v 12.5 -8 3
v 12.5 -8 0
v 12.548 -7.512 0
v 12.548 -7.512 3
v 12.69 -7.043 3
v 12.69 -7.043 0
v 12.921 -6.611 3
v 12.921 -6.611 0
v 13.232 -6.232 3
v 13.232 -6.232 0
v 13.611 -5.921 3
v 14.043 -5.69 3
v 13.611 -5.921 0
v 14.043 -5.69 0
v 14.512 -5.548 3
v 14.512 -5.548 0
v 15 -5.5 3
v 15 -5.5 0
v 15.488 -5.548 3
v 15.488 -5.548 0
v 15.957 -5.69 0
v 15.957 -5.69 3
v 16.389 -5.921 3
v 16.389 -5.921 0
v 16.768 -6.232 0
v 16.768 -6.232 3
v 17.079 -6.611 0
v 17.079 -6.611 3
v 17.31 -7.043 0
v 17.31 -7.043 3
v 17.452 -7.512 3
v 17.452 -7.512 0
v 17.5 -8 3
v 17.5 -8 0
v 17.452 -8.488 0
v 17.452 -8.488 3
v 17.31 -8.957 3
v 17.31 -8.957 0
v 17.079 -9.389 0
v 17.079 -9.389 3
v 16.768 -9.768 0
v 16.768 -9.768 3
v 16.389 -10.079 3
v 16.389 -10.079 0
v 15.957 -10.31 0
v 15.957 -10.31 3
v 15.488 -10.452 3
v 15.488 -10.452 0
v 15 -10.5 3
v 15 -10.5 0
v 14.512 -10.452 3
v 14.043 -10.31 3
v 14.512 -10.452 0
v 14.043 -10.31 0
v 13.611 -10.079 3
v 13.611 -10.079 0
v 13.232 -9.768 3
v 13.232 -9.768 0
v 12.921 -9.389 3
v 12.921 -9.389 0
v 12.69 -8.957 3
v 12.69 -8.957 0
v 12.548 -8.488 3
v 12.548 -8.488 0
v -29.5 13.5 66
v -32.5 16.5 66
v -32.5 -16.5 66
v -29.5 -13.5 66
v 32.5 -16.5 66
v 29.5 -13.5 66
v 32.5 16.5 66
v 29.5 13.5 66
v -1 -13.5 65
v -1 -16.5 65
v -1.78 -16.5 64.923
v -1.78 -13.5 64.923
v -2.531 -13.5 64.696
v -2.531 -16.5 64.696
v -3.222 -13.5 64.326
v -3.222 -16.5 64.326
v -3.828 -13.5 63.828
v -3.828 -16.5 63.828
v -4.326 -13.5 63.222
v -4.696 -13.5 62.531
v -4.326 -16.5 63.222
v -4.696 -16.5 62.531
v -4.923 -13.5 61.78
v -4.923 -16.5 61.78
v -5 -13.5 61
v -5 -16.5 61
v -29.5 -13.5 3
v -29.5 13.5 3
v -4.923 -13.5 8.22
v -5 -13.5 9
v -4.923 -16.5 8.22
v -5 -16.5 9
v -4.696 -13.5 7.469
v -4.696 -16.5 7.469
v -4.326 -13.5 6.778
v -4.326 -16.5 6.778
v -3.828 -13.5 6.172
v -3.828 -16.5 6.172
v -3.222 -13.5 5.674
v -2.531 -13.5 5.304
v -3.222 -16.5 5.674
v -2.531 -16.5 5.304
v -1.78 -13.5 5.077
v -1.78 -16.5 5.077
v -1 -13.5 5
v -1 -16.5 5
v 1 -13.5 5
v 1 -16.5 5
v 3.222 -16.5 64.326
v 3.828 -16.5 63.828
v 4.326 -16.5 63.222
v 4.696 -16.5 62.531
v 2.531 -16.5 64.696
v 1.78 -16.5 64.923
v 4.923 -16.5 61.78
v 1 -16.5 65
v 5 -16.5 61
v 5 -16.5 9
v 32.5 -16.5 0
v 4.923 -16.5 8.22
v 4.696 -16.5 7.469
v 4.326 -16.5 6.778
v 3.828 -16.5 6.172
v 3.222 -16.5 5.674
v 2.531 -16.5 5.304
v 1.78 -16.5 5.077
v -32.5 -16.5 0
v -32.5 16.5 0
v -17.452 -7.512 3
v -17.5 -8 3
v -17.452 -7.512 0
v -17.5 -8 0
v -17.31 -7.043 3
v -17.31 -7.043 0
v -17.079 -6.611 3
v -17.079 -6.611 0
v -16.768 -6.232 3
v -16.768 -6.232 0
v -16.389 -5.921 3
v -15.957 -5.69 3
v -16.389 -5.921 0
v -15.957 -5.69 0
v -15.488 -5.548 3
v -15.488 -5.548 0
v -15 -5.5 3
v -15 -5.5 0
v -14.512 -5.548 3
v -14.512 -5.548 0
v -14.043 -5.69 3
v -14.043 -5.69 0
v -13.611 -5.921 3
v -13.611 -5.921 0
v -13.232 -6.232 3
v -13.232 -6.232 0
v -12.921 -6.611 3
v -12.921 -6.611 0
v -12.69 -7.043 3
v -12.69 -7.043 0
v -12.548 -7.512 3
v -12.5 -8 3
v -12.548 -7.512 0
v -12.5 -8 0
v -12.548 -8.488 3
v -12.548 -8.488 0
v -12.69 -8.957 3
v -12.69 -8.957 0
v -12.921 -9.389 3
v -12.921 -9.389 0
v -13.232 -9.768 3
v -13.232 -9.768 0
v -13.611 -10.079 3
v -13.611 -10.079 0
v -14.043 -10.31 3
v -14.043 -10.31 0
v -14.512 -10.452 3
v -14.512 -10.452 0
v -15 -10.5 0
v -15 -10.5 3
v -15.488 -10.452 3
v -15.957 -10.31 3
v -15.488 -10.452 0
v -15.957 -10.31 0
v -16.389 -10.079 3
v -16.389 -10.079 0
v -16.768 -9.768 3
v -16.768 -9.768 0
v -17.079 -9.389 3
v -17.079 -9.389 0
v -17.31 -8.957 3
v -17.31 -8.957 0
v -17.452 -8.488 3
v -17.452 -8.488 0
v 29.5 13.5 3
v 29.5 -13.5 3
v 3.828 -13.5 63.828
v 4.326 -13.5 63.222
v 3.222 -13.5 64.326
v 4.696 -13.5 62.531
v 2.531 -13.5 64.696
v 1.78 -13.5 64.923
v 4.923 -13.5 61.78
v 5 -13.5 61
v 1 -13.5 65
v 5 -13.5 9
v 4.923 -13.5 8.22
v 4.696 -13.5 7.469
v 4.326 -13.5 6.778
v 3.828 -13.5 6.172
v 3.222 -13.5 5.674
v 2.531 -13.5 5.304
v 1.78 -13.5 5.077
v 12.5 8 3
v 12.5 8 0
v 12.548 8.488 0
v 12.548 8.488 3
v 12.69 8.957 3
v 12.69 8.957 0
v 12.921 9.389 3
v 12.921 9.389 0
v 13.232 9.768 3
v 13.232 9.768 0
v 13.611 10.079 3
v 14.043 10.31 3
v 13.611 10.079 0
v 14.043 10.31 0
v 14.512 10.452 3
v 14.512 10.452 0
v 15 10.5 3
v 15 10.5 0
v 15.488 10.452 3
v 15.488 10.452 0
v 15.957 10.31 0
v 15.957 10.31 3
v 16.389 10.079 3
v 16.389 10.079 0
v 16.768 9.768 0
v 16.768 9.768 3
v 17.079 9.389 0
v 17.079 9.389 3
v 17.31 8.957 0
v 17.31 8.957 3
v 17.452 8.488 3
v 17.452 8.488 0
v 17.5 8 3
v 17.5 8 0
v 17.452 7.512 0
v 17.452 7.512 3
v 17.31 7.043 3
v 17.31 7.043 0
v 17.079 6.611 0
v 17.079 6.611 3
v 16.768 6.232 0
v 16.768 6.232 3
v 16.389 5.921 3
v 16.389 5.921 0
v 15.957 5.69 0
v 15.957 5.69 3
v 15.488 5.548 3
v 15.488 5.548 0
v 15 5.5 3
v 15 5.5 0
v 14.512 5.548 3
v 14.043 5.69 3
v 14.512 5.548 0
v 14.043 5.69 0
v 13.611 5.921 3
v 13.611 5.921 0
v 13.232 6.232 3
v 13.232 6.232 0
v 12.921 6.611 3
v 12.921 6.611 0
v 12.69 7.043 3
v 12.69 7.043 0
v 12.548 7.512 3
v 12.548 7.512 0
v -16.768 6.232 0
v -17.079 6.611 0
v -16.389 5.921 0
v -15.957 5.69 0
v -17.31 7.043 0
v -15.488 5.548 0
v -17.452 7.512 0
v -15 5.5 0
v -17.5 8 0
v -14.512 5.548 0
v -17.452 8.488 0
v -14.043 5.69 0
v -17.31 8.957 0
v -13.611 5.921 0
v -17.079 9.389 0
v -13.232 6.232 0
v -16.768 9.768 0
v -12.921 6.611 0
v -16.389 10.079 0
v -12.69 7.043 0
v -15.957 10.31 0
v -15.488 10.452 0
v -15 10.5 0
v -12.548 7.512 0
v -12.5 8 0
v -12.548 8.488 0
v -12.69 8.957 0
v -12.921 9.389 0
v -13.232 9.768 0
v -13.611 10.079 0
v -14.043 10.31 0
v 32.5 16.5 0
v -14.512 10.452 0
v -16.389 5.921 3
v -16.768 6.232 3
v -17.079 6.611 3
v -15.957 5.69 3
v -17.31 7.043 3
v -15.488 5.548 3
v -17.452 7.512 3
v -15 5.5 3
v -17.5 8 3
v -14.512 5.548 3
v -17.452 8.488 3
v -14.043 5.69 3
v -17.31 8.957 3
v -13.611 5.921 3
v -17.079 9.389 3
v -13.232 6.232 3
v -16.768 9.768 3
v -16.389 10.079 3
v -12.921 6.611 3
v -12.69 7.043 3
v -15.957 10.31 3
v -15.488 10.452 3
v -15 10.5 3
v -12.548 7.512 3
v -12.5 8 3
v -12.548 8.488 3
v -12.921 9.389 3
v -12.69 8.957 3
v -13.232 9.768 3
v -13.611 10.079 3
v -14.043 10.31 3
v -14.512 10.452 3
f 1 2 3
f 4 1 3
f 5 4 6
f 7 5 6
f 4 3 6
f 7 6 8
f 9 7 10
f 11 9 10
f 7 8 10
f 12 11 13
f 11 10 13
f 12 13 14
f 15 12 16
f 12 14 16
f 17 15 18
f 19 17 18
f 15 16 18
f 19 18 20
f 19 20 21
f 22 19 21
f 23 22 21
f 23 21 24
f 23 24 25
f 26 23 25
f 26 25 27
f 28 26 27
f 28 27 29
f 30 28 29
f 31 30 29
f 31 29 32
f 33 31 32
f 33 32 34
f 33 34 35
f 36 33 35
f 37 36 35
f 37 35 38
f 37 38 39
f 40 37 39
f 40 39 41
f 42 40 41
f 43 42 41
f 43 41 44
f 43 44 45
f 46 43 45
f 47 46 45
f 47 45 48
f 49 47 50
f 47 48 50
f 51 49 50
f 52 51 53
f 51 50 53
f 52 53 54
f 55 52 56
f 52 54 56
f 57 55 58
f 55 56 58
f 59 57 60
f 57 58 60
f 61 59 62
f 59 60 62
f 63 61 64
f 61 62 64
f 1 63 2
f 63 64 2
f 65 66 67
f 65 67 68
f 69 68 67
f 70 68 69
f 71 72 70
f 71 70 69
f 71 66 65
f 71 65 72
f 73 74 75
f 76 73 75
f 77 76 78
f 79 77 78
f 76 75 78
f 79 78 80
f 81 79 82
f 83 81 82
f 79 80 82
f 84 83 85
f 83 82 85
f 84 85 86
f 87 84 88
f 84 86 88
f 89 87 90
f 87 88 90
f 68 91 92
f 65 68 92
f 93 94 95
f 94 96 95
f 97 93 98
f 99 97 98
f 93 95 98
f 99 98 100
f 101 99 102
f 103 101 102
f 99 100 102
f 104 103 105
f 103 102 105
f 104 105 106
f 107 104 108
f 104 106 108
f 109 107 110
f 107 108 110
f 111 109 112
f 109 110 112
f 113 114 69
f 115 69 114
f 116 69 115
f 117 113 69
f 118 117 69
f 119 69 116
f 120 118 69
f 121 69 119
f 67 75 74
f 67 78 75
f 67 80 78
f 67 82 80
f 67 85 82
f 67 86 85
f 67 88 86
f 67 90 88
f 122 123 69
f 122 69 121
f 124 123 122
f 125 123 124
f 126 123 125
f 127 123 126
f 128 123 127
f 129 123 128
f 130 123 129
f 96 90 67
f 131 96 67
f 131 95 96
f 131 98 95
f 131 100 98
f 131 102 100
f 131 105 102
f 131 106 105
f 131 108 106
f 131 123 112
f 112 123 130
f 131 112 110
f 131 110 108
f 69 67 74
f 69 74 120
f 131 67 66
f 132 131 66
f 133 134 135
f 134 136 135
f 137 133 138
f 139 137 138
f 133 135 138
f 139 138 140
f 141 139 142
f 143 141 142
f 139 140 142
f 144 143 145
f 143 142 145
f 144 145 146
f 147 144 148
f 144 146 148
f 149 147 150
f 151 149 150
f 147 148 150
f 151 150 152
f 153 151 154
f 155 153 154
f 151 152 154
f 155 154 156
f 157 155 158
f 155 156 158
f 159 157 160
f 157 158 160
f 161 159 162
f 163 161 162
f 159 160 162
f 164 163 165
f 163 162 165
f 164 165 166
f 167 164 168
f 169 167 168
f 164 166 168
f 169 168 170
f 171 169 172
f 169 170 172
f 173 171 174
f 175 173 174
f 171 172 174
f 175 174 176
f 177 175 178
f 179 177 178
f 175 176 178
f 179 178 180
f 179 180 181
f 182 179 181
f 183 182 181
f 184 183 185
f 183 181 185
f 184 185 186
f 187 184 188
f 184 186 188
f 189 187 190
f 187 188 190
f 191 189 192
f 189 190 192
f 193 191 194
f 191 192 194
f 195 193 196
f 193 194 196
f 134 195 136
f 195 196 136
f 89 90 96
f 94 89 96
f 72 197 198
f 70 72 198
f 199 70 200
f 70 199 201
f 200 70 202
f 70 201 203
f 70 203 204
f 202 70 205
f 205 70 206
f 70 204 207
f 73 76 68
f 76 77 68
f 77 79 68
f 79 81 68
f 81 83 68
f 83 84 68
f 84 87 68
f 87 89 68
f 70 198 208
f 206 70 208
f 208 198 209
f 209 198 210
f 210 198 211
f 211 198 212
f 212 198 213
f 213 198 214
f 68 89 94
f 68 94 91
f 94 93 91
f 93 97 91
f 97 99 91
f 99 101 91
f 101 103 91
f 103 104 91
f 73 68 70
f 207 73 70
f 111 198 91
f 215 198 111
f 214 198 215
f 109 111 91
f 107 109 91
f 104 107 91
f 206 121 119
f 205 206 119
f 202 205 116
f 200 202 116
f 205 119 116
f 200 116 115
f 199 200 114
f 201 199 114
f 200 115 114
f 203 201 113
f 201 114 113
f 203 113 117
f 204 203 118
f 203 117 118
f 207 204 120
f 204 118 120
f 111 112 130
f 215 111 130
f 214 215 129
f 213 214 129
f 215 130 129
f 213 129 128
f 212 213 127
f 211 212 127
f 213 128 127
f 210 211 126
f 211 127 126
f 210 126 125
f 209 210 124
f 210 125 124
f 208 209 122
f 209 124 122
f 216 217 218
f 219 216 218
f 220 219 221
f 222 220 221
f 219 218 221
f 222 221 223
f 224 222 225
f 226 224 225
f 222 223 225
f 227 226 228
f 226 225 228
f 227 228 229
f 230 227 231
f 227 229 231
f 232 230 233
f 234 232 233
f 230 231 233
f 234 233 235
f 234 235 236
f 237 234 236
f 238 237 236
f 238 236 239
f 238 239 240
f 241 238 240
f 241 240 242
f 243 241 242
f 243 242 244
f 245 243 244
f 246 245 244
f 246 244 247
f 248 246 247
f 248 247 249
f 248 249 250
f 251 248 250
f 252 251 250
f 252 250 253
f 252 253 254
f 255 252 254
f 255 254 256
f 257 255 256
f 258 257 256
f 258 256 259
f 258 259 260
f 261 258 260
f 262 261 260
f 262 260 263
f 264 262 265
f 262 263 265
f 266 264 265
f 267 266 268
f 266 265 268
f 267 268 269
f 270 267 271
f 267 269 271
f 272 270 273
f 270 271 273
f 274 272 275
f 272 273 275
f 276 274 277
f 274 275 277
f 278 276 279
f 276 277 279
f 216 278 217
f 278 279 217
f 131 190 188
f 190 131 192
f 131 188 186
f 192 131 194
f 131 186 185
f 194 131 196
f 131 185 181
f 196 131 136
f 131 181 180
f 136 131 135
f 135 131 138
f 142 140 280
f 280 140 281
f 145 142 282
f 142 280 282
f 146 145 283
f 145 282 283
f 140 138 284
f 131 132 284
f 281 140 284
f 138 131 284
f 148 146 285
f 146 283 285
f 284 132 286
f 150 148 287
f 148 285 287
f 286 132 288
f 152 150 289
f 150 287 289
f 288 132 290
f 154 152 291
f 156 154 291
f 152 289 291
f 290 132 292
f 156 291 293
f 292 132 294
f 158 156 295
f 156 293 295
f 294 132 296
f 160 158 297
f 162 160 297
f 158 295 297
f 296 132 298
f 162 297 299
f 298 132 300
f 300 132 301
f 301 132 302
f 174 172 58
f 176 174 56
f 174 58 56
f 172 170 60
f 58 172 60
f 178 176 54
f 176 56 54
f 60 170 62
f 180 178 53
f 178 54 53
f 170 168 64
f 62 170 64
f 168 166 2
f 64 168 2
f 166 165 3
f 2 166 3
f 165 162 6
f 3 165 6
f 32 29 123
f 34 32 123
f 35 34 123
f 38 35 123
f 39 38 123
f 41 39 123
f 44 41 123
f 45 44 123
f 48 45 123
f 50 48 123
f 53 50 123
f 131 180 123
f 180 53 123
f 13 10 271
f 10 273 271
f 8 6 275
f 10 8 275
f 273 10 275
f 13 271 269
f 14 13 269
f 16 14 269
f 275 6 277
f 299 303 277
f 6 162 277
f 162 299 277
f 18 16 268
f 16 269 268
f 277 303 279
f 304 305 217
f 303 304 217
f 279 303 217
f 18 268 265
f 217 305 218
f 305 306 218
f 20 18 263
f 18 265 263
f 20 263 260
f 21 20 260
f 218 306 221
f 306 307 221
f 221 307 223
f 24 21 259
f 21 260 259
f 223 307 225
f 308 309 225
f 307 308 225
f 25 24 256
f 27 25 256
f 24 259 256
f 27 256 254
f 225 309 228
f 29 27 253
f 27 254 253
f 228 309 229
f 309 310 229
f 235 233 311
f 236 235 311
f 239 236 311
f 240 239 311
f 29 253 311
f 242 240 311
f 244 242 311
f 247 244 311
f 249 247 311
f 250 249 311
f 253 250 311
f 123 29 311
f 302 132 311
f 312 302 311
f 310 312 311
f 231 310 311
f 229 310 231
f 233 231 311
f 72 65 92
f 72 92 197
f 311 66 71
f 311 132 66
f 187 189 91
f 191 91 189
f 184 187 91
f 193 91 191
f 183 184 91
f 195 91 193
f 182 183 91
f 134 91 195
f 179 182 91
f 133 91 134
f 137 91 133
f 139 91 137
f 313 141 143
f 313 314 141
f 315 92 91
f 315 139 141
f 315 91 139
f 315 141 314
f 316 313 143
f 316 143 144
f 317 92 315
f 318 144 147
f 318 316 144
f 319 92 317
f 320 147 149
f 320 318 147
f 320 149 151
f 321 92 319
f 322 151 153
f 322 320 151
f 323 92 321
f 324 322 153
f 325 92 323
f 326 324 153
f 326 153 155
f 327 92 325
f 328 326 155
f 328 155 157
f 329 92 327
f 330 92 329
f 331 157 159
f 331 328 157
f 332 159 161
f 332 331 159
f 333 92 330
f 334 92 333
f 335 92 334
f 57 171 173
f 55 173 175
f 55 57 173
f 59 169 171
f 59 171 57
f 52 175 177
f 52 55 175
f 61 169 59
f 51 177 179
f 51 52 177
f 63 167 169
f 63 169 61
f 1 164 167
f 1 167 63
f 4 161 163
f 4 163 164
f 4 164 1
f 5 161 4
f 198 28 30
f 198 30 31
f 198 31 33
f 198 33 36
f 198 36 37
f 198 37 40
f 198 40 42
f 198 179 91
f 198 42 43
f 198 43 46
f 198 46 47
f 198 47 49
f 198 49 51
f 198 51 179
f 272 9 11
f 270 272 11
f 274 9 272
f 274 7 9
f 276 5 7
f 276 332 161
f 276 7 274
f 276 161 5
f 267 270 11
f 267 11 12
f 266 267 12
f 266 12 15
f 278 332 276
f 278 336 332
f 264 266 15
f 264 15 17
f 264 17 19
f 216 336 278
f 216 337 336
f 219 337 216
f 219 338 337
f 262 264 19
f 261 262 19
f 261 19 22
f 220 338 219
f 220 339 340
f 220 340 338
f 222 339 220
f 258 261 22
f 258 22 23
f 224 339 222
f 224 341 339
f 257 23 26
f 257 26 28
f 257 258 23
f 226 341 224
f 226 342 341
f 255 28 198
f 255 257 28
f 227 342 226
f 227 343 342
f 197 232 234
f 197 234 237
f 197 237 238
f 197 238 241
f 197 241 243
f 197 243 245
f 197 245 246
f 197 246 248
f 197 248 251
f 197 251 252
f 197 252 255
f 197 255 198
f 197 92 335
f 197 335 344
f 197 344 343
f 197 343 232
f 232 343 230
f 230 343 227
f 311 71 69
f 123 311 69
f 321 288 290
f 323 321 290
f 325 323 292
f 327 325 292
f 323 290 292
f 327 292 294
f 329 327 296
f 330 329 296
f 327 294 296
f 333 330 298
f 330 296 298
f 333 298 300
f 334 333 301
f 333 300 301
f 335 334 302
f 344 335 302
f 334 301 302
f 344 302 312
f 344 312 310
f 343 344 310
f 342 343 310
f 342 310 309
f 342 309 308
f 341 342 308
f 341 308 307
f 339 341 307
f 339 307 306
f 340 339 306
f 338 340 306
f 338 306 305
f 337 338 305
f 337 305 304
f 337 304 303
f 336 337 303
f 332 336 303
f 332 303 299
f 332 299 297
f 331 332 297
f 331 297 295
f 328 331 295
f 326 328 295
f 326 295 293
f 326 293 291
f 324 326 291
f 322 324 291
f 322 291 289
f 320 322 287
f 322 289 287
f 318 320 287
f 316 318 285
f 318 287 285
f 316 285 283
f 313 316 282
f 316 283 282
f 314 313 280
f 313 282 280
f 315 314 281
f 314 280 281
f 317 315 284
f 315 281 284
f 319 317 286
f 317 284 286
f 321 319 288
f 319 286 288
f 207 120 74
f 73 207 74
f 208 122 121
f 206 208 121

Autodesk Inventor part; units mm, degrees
ref_plane "YZ Plane" through (0, 0, 0) normal (1, 0, 0) x (0, 1, 0)
ref_plane "XZ Plane" through (0, 0, 0) normal (0, 1, 0) x (-1, 0, 0)
ref_plane "XY Plane" through (0, 0, 0) normal (0, 0, 1) x (1, 0, 0)
sketch "Sketch1" plane through (0, 0, 0) normal (0, 0, 1) x (1, 0, 0)
  line L0 (-32.5, 16.5) -> (32.5, 16.5)
  line L1 (32.5, 16.5) -> (32.5, -16.5)
  line L2 (32.5, -16.5) -> (-32.5, -16.5)
  line L3 (-32.5, -16.5) -> (-32.5, 16.5)
  line L4 (-32.5, 16.5) -> (32.5, -16.5) construction
  line L5 (32.5, 16.5) -> (-32.5, -16.5) construction
  point P0 (0, 0)
  dimension "d0" = 65
  dimension "d1" = 33
extrude "Extrusion1" add sketch "Sketch1" along normal blind 66
shell "Shell1" thickness 3 removed faces 1 at (-10.8333, 5.5, 66)
sketch "Sketch2" plane through (-32.5, -16.5, 0) normal (0, -1, 0) x (1, 0, 0)
  line L0 (33.5, 65) -> (31.5, 65)
  line L1 (27.5, 61) -> (27.5, 9)
  line L2 (31.5, 5) -> (33.5, 5)
  line L3 (37.5, 9) -> (37.5, 61)
  line L4 (32.5, 0) -> (32.5, 66) construction
  line L5 (65, 66) -> (0, 66) projected
  line L6 (0, 0) -> (65, 0) projected
  arc A0 (33.5, 5) -> (37.5, 9) centre (33.5, 9) ccw
  arc A1 (27.5, 9) -> (31.5, 5) centre (31.5, 9) ccw
  arc A2 (37.5, 61) -> (33.5, 65) centre (33.5, 61) ccw
  arc A3 (31.5, 65) -> (27.5, 61) centre (31.5, 61) ccw
  point P0 (37.5, 65)
  point P1 (27.5, 65)
  point P2 (27.5, 5)
  point P3 (37.5, 5)
  dimension "d5" = 10
  dimension "d6" = 60
  dimension "d7" = 5
  dimension "d10" = 4
extrude "Extrusion2" cut sketch "Sketch2" against normal up to surface (30 mm away)
sketch "Sketch3" plane through (0, 0, 0) normal (0, 0, -1) x (-1, 0, 0)
  line L0 (32.5, 16.5) -> (32.5, -16.5) projected
  line L1 (32.5, 0) -> (-32.5, 0) construction
  line L2 (-32.5, -16.5) -> (-32.5, 16.5) projected
  circle A0 centre (-15, -8) radius 2.5
  circle A1 centre (-15, 8) radius 2.5
  circle A2 centre (15, -8) radius 2.5
  circle A3 centre (15, 8) radius 2.5
  point P0 (0, 0)
  point P1 (0, 0)
  dimension "d11" = 5
  dimension "d12" = 5
  dimension "d13" = 5
  dimension "d14" = 5
  dimension "d15" = 8
  dimension "d16" = 8
  dimension "d17" = 30
  dimension "d18" = 15
extrude "Extrusion3" cut sketch "Sketch3" against normal through all
properties part number "SLIDER" material "Steel, Alloy"
